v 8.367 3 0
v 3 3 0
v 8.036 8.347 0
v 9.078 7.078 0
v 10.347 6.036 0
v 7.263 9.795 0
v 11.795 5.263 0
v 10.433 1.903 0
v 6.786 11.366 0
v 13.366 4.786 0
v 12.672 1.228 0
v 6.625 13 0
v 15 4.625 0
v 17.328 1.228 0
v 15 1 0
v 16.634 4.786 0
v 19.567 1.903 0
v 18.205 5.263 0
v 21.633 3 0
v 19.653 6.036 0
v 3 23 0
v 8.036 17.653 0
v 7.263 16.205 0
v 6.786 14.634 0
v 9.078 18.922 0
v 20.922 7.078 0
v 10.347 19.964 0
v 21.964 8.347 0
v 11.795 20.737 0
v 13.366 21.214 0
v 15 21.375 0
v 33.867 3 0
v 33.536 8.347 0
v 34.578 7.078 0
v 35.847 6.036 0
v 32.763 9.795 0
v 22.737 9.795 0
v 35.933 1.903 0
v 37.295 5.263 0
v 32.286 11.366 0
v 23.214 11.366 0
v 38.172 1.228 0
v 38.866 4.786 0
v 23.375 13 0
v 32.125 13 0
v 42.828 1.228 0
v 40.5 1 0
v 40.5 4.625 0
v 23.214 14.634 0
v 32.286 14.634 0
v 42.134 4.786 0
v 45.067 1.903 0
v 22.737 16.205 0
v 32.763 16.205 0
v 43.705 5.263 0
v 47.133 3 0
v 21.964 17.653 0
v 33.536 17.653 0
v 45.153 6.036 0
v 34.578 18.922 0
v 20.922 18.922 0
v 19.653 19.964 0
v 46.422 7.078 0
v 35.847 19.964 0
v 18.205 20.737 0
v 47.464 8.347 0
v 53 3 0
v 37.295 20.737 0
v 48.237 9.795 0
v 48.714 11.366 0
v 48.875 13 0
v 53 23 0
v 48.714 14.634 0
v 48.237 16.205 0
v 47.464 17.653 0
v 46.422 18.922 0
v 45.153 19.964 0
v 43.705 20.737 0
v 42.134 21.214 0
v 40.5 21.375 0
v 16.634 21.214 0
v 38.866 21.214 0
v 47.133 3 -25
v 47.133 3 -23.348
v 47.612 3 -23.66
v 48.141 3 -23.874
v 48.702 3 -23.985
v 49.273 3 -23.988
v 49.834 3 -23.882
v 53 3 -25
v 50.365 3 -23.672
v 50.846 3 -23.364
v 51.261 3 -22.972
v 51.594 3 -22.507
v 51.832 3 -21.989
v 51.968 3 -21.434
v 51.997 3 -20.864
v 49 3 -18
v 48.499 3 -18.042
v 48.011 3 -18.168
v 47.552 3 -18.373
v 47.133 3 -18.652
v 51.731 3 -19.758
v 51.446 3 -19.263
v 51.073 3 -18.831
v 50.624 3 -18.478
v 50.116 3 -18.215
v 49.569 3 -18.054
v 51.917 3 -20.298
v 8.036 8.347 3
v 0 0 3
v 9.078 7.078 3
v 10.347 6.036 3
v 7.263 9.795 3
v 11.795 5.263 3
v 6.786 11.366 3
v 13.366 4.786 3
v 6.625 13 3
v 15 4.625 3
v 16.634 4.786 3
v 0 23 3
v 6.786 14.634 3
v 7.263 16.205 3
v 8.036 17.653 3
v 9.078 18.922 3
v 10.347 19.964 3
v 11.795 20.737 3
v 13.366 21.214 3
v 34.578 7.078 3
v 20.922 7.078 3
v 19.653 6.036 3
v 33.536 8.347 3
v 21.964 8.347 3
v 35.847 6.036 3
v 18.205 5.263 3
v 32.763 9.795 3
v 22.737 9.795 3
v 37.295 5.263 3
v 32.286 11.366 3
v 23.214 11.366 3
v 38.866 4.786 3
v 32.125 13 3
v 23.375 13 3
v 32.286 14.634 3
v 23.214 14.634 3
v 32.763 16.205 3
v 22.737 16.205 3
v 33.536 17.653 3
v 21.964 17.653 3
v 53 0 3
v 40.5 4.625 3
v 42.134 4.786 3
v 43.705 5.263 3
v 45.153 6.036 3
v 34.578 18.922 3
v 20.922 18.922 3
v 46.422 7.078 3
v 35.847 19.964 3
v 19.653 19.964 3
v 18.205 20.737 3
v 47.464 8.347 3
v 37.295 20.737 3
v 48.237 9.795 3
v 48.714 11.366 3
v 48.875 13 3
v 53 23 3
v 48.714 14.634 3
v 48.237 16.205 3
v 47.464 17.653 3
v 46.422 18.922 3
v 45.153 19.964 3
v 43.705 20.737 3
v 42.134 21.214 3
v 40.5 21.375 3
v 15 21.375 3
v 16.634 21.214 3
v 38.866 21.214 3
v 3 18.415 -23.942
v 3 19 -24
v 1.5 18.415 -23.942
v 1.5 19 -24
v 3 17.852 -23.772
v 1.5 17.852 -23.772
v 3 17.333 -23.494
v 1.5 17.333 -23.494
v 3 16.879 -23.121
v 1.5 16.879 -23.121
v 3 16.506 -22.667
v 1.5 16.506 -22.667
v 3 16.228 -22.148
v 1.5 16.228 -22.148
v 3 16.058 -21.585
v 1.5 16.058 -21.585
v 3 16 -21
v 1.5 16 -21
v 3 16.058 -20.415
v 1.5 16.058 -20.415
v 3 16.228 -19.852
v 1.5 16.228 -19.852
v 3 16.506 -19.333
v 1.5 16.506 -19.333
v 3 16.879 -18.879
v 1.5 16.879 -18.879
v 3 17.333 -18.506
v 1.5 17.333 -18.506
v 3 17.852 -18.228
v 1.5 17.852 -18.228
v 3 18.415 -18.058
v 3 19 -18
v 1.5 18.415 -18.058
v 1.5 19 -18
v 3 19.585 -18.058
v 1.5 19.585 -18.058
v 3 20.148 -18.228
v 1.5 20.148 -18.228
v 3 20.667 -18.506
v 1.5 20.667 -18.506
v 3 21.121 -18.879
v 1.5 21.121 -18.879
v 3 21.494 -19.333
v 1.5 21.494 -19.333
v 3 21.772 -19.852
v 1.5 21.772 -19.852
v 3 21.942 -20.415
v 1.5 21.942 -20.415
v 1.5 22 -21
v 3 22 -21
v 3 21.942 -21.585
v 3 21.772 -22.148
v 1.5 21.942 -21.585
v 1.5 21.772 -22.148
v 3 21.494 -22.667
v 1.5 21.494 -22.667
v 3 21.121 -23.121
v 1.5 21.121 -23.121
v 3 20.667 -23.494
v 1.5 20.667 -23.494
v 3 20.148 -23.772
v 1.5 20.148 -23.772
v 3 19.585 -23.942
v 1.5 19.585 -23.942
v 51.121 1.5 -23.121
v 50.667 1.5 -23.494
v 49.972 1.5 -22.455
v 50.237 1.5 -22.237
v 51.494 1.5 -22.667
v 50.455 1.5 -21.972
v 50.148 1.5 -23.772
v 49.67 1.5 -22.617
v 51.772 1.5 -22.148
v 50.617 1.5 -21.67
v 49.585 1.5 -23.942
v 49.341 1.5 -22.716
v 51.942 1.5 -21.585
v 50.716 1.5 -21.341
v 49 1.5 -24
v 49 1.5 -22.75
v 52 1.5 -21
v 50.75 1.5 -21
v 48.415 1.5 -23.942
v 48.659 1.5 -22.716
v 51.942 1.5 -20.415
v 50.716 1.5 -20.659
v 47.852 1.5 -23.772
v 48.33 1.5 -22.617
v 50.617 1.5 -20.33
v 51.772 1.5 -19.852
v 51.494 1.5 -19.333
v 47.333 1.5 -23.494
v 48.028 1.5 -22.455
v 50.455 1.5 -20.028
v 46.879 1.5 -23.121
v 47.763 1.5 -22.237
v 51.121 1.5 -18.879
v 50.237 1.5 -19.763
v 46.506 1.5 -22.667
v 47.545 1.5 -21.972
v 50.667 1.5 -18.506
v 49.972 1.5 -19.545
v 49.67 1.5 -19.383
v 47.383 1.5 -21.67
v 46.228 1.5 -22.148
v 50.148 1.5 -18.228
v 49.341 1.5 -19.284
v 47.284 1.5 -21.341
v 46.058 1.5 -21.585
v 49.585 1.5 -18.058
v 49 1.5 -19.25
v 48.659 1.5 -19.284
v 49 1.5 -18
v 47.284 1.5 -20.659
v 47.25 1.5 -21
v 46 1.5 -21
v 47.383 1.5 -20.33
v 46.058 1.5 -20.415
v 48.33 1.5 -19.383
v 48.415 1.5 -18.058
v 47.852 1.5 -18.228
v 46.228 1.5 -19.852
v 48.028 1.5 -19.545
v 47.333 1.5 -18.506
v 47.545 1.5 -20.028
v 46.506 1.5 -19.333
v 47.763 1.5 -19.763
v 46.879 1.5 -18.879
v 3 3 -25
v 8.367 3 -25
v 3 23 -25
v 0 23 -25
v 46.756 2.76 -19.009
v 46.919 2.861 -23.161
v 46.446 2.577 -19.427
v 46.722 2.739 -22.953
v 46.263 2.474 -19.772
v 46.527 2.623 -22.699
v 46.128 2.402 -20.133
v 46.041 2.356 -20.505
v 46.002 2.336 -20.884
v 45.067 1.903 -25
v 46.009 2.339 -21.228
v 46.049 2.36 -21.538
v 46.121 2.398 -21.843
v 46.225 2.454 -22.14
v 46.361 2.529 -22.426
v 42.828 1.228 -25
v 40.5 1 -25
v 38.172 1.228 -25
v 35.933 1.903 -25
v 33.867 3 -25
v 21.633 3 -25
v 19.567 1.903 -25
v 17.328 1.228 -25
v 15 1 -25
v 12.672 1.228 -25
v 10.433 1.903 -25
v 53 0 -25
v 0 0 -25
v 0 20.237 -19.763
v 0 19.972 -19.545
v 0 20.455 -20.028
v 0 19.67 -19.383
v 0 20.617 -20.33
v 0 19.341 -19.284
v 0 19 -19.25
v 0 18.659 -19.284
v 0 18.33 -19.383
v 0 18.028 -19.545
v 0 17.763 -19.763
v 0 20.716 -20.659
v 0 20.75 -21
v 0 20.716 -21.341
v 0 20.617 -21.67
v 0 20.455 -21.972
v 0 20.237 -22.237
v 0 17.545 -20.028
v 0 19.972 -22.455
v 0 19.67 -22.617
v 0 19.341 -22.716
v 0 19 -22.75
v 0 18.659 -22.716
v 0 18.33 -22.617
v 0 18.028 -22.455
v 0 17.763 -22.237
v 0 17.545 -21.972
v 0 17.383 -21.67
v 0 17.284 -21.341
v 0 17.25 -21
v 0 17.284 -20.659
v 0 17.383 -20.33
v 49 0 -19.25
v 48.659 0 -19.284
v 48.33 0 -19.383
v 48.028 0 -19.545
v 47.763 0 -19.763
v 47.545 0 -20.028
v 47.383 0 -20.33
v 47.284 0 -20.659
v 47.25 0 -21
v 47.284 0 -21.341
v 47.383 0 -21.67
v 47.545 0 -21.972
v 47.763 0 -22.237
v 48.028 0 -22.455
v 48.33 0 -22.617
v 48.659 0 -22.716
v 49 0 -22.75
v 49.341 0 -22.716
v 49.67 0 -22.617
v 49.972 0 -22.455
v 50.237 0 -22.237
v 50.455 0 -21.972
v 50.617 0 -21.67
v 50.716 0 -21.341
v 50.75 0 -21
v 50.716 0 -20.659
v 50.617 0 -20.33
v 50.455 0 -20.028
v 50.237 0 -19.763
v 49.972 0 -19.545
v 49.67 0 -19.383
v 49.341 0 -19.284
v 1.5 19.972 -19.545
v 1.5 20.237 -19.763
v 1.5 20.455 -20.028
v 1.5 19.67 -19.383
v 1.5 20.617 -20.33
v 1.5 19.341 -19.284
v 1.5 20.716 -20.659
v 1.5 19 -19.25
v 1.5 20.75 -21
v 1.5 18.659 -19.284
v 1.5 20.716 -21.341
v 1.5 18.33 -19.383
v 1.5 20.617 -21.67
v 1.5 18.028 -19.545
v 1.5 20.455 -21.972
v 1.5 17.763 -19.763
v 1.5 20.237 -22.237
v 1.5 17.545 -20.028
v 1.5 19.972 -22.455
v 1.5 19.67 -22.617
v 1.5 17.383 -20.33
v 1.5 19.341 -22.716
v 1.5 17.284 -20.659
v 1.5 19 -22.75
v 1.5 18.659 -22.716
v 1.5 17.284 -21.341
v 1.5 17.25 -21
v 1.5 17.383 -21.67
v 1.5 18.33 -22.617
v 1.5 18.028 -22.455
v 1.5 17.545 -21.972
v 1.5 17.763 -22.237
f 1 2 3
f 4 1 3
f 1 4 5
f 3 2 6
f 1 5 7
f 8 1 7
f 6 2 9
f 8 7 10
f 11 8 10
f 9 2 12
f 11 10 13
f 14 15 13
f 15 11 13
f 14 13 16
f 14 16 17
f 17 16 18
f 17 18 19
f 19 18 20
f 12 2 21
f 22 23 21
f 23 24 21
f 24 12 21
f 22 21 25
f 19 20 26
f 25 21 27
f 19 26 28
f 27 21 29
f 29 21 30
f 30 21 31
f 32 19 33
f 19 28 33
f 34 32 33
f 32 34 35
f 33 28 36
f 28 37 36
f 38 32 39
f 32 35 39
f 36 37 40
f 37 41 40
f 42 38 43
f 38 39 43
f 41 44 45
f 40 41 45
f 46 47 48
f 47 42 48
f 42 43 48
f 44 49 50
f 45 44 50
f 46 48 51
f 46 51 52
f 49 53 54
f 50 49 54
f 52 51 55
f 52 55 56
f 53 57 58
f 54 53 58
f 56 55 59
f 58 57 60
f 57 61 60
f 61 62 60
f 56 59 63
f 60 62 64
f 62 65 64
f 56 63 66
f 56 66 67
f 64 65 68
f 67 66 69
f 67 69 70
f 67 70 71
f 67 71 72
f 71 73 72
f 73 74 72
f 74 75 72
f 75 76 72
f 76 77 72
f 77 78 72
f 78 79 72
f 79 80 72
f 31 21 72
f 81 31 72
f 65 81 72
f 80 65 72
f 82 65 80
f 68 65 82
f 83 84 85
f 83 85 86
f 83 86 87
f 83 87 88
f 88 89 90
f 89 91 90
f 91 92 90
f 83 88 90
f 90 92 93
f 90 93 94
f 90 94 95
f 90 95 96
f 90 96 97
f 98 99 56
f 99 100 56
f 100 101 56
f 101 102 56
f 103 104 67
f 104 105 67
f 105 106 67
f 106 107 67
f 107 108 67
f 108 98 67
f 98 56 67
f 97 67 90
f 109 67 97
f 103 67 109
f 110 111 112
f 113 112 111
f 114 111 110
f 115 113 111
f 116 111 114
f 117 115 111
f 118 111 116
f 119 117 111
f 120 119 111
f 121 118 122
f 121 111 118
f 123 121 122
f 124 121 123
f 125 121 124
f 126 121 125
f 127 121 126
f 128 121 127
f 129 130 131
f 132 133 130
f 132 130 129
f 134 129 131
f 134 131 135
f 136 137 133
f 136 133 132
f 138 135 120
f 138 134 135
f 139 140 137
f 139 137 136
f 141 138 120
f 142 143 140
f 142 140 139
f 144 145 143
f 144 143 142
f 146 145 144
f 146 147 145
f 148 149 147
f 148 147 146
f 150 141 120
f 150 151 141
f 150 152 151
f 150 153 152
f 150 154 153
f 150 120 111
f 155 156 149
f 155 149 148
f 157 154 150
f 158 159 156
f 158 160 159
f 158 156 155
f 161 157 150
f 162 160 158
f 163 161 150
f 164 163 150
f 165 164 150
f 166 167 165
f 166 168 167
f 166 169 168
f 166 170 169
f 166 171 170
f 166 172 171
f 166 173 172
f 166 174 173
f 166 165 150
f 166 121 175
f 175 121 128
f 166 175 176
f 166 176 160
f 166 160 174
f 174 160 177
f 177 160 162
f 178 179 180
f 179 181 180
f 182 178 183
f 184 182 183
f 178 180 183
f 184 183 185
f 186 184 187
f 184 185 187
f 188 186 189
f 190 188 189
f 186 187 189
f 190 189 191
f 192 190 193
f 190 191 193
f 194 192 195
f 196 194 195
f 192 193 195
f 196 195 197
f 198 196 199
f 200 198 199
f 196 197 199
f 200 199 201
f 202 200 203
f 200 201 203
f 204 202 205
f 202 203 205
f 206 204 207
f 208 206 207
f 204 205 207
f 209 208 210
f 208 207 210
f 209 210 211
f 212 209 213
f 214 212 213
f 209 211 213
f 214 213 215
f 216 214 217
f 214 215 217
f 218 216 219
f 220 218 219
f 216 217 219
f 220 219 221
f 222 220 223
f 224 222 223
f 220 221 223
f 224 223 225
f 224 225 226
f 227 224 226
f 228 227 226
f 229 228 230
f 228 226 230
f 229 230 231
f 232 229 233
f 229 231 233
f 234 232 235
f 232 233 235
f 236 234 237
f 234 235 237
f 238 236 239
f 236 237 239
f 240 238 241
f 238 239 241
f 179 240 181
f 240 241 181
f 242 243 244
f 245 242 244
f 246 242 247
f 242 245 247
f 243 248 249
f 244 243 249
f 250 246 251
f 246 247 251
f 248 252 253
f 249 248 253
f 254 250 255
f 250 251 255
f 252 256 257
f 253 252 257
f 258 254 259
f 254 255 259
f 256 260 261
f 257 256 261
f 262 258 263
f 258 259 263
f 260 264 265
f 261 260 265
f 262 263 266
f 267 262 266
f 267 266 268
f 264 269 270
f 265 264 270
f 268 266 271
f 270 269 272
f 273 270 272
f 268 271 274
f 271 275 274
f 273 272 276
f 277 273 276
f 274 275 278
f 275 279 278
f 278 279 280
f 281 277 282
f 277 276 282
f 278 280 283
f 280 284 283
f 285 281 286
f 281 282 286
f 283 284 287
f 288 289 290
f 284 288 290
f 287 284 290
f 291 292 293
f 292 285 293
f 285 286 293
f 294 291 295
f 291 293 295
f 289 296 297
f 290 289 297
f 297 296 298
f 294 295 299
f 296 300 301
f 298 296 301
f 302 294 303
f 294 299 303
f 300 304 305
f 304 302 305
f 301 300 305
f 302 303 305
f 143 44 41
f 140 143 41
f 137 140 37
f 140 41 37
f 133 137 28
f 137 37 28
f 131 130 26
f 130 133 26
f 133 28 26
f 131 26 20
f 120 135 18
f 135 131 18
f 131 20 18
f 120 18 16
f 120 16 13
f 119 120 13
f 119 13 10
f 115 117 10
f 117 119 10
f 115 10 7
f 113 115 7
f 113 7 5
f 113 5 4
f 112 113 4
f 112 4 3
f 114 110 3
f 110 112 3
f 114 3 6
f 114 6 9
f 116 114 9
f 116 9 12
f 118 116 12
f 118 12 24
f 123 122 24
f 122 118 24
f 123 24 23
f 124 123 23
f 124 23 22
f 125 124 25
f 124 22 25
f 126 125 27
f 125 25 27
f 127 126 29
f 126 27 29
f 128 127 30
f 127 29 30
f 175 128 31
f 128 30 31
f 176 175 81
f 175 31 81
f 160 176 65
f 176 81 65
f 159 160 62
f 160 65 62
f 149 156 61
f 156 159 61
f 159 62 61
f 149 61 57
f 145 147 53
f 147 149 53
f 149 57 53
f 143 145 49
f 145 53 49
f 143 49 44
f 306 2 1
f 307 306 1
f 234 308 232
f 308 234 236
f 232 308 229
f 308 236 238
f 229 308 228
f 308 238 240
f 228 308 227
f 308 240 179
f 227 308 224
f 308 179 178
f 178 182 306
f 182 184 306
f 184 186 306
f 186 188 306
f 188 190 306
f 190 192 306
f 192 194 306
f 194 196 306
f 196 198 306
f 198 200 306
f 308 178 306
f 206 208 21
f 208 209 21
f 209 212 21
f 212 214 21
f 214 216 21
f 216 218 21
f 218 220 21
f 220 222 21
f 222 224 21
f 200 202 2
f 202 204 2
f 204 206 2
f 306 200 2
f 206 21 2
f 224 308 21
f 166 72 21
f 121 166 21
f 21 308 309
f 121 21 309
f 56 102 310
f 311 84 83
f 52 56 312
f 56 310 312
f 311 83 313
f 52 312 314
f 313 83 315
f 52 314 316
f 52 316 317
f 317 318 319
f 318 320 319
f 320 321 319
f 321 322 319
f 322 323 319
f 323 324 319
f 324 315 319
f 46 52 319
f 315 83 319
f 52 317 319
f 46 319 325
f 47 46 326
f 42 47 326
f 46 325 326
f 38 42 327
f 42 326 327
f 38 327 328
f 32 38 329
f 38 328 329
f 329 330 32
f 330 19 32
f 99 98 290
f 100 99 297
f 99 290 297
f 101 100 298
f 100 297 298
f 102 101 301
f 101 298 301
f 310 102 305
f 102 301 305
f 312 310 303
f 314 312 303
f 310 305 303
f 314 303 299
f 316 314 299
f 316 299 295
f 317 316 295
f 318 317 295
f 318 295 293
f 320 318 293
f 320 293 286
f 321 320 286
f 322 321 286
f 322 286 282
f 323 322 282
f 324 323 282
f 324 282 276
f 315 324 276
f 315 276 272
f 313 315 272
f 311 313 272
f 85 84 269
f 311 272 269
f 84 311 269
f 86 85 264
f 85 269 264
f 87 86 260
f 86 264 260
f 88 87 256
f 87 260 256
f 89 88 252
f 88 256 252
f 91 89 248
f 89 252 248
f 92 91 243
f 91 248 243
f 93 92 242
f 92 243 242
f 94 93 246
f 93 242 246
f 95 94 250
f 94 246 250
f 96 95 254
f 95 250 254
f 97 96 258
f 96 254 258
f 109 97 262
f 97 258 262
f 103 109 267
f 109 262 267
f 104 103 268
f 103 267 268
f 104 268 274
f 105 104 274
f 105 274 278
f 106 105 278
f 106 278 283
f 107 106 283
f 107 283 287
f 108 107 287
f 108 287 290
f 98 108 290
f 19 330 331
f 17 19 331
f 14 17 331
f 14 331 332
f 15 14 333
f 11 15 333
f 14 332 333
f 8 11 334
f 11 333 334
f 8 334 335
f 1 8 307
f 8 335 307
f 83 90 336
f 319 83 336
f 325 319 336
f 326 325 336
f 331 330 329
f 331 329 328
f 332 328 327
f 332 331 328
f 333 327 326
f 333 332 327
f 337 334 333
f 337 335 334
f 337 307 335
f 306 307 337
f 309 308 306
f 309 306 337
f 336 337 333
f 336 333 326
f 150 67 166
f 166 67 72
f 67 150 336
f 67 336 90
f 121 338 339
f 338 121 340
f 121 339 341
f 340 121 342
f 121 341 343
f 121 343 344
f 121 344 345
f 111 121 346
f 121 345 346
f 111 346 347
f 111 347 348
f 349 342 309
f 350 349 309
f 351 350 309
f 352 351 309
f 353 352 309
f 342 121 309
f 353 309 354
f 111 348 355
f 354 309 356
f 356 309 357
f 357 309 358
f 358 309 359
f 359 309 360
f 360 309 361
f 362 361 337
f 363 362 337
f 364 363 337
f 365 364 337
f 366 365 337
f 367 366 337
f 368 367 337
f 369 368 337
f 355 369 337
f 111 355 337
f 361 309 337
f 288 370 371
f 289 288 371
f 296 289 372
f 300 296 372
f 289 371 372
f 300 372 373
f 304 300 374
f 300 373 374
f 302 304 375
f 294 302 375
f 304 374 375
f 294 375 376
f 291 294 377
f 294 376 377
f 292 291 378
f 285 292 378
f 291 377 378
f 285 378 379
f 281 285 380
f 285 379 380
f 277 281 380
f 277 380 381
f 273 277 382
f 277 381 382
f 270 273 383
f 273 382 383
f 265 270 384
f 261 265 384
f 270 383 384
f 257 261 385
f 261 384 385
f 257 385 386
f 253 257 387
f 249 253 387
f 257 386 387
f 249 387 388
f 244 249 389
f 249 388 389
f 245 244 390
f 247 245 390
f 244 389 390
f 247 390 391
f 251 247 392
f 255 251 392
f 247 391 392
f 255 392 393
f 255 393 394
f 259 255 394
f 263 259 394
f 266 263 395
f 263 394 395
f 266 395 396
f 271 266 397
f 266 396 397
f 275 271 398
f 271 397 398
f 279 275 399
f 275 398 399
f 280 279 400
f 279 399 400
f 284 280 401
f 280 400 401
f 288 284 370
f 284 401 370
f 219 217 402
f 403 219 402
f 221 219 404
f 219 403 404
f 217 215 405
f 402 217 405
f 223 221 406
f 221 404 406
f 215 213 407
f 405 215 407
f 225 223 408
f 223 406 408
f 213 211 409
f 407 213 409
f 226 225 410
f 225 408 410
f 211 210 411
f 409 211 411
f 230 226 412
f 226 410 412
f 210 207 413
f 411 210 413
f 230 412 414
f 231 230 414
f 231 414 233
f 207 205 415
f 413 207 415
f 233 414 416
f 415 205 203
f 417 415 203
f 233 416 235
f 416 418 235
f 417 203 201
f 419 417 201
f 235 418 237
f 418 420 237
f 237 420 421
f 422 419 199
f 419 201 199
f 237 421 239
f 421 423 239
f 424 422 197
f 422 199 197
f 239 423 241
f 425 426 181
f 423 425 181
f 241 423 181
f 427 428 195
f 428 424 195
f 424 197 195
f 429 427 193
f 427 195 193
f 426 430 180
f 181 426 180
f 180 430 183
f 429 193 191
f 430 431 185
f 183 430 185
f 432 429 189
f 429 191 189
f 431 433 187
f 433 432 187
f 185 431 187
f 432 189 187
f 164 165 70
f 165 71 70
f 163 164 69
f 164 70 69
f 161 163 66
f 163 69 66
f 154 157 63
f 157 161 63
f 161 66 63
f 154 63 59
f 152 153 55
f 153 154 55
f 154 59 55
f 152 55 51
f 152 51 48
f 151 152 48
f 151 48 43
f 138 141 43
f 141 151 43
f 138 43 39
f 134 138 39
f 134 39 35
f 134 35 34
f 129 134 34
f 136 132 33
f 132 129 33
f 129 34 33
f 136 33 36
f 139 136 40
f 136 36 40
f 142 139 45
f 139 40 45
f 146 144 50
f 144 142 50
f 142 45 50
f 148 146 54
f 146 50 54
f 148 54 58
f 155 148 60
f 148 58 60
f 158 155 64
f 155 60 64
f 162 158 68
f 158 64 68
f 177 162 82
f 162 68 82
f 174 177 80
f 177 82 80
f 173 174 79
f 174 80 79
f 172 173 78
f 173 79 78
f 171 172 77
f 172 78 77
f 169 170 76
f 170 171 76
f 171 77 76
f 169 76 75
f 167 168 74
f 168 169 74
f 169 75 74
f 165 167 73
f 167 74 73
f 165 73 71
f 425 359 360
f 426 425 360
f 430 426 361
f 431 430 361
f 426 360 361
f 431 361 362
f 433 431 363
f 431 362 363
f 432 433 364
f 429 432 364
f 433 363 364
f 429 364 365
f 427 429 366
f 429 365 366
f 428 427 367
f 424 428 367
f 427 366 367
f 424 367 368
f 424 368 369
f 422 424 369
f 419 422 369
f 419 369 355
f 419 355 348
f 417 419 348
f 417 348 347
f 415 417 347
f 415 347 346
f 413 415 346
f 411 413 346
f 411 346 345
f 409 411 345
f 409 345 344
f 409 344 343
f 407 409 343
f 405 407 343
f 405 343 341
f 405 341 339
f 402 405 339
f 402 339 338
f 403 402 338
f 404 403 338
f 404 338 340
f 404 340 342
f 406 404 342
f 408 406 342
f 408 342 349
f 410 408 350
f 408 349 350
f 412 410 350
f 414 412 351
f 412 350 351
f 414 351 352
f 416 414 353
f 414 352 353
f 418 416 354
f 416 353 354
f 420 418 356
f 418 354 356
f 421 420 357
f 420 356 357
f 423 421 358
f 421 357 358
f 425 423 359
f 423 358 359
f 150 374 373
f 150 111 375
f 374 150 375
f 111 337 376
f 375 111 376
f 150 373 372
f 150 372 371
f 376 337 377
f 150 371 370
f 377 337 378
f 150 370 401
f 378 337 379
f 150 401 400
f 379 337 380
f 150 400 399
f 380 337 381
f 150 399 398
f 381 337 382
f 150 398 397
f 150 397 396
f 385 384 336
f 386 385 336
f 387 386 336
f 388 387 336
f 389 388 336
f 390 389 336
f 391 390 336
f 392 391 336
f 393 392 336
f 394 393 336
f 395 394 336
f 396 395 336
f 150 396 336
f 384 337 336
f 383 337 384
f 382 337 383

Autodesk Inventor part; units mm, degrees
ref_plane "YZ Plane" through (0, 0, 0) normal (1, 0, 0) x (0, 1, 0)
ref_plane "XZ Plane" through (0, 0, 0) normal (0, 1, 0) x (-1, 0, 0)
ref_plane "XY Plane" through (0, 0, 0) normal (0, 0, 1) x (1, 0, 0)
sketch "Skizze1" plane through (0, 0, 0) normal (0, 0, 1) x (1, 0, 0)
  line L0 (0, 0) -> (53, 0)
  line L1 (53, 0) -> (53, 23)
  line L2 (53, 23) -> (0, 23)
  line L3 (0, 23) -> (0, 0)
  circle A0 centre (15, 13) radius 8.375
  circle A1 centre (40.5, 13) radius 8.375
  dimension "D" = 16.75
  dimension "d1" = 16.75
  dimension "Hoehe" = 23
  dimension "L" = 53
  dimension "d5" = 15
  dimension "d7" = 10
  dimension "d14" = 12.5
extrude "Extrusion1" add sketch "Skizze1" along normal blind 3
sketch "Skizze2" plane through (0, 0, 0) normal (0, 0, -1) x (-1, 0, 0)
  line L0 (-53, 0) -> (-53, 23) projected
  line L1 (0, 0) -> (-53, 0) projected
  line L2 (0, 23) -> (0, 0) projected
  line L3 (-53, 23) -> (0, 23) projected
  circle A0 centre (-15, 13) radius 8.375 projected
  circle A1 centre (-40.5, 13) radius 8.375 projected
  line L4 (-53, 23) -> (0, 23) projected
  line L5 (-3, 23) -> (-3, 3)
  line L6 (-3, 3) -> (-53, 3)
  dimension "Dicke" = 3
  dimension "d11" = 3
extrude "Extrusion2" add sketch "Skizze2" along normal blind 25 contours L0 L6 L5 L3 L2 L1
sketch "Skizze3" plane through (3, 3, 0) normal (0, 1, 0) x (1, 0, 0)
  line L0 (50, 0) -> (50, 25) projected
  line L1 (0, 25) -> (50, 25) projected
  point P0 (-3, 0)
  point P1 (46, 21)
  dimension "d22" = 4
  dimension "d23" = 4
hole "Bohrung1" at (49, 3, -21) direction (0, -1, 0) diameter 3.5 end through all counterbore diameter 6 counterbore depth 1.5
sketch "Skizze4" plane through (3, 3, 0) normal (1, 0, 0) x (0, 0, -1)
  line L0 (0, 20) -> (25, 20) projected
  line L1 (25, 20) -> (25, 0) projected
  point P0 (0, -3)
  point P1 (21, 16)
  dimension "d31" = 4
  dimension "d32" = 4
hole "Bohrung2" at (3, 19, -21) direction (-1, 0, 0) diameter 3.5 end through all counterbore diameter 6 counterbore depth 1.5
sketch "Skizze5" plane through (0, 0, -25) normal (0, 0, -1) x (-1, 0, 0)
  circle A0 centre (-40.5, 13) radius 8.375 projected
  circle A1 centre (-15, 13) radius 8.375 projected
  circle A2 centre (-40.5, 13) radius 12
  circle A3 centre (-15, 13) radius 12
  point P0 (0, 0)
  point P1 (-29.75, 9.4628)
  point P2 (-29.75, 14.5372)
  dimension "d33" = 24
  dimension "d34" = 24
extrude "Extrusion3" cut sketch "Skizze5" against normal blind 25
equation "\"d1\" = D"
equation "\"d11\" = Dicke"
equation "\"d23\" = d22"
equation "\"d34\" = d33"
properties part number "Buttons_Mount_v3"
